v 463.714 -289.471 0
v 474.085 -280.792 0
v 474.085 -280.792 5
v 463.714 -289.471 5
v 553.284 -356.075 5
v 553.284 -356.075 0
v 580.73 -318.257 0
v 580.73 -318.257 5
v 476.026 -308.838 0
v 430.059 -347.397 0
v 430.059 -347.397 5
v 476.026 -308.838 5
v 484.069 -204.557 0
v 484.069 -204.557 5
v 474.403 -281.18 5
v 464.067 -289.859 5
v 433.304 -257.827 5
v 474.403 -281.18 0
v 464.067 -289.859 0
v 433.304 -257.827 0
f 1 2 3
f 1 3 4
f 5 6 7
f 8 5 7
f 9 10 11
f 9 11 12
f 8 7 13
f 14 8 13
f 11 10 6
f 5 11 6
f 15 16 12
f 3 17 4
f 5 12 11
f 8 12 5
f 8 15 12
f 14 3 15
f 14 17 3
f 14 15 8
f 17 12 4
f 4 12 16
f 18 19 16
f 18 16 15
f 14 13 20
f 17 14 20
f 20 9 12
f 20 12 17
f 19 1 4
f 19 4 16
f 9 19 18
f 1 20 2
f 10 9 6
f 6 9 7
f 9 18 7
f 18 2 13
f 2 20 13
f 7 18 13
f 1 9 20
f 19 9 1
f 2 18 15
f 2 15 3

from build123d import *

# Parameters (mm, degrees)
PAD002_DEPTH = 5


with BuildPart() as part:
    # Sketch004 → Pad002 (new body)
    with BuildSketch(Plane.XY):
        with BuildLine():
            add(Edge.make_bspline(
                [(430.058793, -347.396823), (553.284068, -356.075156)],
                knots=[0, 0, 350.165175, 350.165175], degree=1))
            add(Edge.make_bspline(
                [(430.058793, -347.396823), (476.025736, -308.838213)],
                knots=[0, 0, 170.072279, 170.072279], degree=1))
            add(Edge.make_bspline(
                [(476.025736, -308.838213), (433.304348, -257.826547)],
                knots=[0, 0, 188.611691, 188.611691], degree=1))
            add(Edge.make_bspline(
                [(484.069069, -204.557104), (433.304348, -257.826547)],
                knots=[0, 0, 208.586217, 208.586217], degree=1))
            add(Edge.make_bspline(
                [(580.730178, -318.257379), (484.069069, -204.557104)],
                knots=[0, 0, 423.028711, 423.028711], degree=1))
            add(Edge.make_bspline(
                [(553.284068, -356.075156), (580.730178, -318.257379)],
                knots=[0, 0, 132.456332, 132.456332], degree=1))
        make_face()
        with BuildLine():
            add(Edge.make_bspline(
                [(464.06657, -289.858769), (474.402959, -281.180436)],
                knots=[0, 0, 38.257679, 38.257679], degree=1))
            add(Edge.make_bspline(
                [(474.402959, -281.180436), (474.085459, -280.79238)],
                knots=[0, 0, 1.421267, 1.421267], degree=1))
            add(Edge.make_bspline(
                [(474.085459, -280.79238), (463.713792, -289.470713)],
                knots=[0, 0, 38.334319, 38.334319], degree=1))
            add(Edge.make_bspline(
                [(463.713792, -289.470713), (464.06657, -289.858769)],
                knots=[0, 0, 1.486607, 1.486607], degree=1))
        make_face(mode=Mode.SUBTRACT)
    extrude(amount=PAD002_DEPTH)


solid = part.part
